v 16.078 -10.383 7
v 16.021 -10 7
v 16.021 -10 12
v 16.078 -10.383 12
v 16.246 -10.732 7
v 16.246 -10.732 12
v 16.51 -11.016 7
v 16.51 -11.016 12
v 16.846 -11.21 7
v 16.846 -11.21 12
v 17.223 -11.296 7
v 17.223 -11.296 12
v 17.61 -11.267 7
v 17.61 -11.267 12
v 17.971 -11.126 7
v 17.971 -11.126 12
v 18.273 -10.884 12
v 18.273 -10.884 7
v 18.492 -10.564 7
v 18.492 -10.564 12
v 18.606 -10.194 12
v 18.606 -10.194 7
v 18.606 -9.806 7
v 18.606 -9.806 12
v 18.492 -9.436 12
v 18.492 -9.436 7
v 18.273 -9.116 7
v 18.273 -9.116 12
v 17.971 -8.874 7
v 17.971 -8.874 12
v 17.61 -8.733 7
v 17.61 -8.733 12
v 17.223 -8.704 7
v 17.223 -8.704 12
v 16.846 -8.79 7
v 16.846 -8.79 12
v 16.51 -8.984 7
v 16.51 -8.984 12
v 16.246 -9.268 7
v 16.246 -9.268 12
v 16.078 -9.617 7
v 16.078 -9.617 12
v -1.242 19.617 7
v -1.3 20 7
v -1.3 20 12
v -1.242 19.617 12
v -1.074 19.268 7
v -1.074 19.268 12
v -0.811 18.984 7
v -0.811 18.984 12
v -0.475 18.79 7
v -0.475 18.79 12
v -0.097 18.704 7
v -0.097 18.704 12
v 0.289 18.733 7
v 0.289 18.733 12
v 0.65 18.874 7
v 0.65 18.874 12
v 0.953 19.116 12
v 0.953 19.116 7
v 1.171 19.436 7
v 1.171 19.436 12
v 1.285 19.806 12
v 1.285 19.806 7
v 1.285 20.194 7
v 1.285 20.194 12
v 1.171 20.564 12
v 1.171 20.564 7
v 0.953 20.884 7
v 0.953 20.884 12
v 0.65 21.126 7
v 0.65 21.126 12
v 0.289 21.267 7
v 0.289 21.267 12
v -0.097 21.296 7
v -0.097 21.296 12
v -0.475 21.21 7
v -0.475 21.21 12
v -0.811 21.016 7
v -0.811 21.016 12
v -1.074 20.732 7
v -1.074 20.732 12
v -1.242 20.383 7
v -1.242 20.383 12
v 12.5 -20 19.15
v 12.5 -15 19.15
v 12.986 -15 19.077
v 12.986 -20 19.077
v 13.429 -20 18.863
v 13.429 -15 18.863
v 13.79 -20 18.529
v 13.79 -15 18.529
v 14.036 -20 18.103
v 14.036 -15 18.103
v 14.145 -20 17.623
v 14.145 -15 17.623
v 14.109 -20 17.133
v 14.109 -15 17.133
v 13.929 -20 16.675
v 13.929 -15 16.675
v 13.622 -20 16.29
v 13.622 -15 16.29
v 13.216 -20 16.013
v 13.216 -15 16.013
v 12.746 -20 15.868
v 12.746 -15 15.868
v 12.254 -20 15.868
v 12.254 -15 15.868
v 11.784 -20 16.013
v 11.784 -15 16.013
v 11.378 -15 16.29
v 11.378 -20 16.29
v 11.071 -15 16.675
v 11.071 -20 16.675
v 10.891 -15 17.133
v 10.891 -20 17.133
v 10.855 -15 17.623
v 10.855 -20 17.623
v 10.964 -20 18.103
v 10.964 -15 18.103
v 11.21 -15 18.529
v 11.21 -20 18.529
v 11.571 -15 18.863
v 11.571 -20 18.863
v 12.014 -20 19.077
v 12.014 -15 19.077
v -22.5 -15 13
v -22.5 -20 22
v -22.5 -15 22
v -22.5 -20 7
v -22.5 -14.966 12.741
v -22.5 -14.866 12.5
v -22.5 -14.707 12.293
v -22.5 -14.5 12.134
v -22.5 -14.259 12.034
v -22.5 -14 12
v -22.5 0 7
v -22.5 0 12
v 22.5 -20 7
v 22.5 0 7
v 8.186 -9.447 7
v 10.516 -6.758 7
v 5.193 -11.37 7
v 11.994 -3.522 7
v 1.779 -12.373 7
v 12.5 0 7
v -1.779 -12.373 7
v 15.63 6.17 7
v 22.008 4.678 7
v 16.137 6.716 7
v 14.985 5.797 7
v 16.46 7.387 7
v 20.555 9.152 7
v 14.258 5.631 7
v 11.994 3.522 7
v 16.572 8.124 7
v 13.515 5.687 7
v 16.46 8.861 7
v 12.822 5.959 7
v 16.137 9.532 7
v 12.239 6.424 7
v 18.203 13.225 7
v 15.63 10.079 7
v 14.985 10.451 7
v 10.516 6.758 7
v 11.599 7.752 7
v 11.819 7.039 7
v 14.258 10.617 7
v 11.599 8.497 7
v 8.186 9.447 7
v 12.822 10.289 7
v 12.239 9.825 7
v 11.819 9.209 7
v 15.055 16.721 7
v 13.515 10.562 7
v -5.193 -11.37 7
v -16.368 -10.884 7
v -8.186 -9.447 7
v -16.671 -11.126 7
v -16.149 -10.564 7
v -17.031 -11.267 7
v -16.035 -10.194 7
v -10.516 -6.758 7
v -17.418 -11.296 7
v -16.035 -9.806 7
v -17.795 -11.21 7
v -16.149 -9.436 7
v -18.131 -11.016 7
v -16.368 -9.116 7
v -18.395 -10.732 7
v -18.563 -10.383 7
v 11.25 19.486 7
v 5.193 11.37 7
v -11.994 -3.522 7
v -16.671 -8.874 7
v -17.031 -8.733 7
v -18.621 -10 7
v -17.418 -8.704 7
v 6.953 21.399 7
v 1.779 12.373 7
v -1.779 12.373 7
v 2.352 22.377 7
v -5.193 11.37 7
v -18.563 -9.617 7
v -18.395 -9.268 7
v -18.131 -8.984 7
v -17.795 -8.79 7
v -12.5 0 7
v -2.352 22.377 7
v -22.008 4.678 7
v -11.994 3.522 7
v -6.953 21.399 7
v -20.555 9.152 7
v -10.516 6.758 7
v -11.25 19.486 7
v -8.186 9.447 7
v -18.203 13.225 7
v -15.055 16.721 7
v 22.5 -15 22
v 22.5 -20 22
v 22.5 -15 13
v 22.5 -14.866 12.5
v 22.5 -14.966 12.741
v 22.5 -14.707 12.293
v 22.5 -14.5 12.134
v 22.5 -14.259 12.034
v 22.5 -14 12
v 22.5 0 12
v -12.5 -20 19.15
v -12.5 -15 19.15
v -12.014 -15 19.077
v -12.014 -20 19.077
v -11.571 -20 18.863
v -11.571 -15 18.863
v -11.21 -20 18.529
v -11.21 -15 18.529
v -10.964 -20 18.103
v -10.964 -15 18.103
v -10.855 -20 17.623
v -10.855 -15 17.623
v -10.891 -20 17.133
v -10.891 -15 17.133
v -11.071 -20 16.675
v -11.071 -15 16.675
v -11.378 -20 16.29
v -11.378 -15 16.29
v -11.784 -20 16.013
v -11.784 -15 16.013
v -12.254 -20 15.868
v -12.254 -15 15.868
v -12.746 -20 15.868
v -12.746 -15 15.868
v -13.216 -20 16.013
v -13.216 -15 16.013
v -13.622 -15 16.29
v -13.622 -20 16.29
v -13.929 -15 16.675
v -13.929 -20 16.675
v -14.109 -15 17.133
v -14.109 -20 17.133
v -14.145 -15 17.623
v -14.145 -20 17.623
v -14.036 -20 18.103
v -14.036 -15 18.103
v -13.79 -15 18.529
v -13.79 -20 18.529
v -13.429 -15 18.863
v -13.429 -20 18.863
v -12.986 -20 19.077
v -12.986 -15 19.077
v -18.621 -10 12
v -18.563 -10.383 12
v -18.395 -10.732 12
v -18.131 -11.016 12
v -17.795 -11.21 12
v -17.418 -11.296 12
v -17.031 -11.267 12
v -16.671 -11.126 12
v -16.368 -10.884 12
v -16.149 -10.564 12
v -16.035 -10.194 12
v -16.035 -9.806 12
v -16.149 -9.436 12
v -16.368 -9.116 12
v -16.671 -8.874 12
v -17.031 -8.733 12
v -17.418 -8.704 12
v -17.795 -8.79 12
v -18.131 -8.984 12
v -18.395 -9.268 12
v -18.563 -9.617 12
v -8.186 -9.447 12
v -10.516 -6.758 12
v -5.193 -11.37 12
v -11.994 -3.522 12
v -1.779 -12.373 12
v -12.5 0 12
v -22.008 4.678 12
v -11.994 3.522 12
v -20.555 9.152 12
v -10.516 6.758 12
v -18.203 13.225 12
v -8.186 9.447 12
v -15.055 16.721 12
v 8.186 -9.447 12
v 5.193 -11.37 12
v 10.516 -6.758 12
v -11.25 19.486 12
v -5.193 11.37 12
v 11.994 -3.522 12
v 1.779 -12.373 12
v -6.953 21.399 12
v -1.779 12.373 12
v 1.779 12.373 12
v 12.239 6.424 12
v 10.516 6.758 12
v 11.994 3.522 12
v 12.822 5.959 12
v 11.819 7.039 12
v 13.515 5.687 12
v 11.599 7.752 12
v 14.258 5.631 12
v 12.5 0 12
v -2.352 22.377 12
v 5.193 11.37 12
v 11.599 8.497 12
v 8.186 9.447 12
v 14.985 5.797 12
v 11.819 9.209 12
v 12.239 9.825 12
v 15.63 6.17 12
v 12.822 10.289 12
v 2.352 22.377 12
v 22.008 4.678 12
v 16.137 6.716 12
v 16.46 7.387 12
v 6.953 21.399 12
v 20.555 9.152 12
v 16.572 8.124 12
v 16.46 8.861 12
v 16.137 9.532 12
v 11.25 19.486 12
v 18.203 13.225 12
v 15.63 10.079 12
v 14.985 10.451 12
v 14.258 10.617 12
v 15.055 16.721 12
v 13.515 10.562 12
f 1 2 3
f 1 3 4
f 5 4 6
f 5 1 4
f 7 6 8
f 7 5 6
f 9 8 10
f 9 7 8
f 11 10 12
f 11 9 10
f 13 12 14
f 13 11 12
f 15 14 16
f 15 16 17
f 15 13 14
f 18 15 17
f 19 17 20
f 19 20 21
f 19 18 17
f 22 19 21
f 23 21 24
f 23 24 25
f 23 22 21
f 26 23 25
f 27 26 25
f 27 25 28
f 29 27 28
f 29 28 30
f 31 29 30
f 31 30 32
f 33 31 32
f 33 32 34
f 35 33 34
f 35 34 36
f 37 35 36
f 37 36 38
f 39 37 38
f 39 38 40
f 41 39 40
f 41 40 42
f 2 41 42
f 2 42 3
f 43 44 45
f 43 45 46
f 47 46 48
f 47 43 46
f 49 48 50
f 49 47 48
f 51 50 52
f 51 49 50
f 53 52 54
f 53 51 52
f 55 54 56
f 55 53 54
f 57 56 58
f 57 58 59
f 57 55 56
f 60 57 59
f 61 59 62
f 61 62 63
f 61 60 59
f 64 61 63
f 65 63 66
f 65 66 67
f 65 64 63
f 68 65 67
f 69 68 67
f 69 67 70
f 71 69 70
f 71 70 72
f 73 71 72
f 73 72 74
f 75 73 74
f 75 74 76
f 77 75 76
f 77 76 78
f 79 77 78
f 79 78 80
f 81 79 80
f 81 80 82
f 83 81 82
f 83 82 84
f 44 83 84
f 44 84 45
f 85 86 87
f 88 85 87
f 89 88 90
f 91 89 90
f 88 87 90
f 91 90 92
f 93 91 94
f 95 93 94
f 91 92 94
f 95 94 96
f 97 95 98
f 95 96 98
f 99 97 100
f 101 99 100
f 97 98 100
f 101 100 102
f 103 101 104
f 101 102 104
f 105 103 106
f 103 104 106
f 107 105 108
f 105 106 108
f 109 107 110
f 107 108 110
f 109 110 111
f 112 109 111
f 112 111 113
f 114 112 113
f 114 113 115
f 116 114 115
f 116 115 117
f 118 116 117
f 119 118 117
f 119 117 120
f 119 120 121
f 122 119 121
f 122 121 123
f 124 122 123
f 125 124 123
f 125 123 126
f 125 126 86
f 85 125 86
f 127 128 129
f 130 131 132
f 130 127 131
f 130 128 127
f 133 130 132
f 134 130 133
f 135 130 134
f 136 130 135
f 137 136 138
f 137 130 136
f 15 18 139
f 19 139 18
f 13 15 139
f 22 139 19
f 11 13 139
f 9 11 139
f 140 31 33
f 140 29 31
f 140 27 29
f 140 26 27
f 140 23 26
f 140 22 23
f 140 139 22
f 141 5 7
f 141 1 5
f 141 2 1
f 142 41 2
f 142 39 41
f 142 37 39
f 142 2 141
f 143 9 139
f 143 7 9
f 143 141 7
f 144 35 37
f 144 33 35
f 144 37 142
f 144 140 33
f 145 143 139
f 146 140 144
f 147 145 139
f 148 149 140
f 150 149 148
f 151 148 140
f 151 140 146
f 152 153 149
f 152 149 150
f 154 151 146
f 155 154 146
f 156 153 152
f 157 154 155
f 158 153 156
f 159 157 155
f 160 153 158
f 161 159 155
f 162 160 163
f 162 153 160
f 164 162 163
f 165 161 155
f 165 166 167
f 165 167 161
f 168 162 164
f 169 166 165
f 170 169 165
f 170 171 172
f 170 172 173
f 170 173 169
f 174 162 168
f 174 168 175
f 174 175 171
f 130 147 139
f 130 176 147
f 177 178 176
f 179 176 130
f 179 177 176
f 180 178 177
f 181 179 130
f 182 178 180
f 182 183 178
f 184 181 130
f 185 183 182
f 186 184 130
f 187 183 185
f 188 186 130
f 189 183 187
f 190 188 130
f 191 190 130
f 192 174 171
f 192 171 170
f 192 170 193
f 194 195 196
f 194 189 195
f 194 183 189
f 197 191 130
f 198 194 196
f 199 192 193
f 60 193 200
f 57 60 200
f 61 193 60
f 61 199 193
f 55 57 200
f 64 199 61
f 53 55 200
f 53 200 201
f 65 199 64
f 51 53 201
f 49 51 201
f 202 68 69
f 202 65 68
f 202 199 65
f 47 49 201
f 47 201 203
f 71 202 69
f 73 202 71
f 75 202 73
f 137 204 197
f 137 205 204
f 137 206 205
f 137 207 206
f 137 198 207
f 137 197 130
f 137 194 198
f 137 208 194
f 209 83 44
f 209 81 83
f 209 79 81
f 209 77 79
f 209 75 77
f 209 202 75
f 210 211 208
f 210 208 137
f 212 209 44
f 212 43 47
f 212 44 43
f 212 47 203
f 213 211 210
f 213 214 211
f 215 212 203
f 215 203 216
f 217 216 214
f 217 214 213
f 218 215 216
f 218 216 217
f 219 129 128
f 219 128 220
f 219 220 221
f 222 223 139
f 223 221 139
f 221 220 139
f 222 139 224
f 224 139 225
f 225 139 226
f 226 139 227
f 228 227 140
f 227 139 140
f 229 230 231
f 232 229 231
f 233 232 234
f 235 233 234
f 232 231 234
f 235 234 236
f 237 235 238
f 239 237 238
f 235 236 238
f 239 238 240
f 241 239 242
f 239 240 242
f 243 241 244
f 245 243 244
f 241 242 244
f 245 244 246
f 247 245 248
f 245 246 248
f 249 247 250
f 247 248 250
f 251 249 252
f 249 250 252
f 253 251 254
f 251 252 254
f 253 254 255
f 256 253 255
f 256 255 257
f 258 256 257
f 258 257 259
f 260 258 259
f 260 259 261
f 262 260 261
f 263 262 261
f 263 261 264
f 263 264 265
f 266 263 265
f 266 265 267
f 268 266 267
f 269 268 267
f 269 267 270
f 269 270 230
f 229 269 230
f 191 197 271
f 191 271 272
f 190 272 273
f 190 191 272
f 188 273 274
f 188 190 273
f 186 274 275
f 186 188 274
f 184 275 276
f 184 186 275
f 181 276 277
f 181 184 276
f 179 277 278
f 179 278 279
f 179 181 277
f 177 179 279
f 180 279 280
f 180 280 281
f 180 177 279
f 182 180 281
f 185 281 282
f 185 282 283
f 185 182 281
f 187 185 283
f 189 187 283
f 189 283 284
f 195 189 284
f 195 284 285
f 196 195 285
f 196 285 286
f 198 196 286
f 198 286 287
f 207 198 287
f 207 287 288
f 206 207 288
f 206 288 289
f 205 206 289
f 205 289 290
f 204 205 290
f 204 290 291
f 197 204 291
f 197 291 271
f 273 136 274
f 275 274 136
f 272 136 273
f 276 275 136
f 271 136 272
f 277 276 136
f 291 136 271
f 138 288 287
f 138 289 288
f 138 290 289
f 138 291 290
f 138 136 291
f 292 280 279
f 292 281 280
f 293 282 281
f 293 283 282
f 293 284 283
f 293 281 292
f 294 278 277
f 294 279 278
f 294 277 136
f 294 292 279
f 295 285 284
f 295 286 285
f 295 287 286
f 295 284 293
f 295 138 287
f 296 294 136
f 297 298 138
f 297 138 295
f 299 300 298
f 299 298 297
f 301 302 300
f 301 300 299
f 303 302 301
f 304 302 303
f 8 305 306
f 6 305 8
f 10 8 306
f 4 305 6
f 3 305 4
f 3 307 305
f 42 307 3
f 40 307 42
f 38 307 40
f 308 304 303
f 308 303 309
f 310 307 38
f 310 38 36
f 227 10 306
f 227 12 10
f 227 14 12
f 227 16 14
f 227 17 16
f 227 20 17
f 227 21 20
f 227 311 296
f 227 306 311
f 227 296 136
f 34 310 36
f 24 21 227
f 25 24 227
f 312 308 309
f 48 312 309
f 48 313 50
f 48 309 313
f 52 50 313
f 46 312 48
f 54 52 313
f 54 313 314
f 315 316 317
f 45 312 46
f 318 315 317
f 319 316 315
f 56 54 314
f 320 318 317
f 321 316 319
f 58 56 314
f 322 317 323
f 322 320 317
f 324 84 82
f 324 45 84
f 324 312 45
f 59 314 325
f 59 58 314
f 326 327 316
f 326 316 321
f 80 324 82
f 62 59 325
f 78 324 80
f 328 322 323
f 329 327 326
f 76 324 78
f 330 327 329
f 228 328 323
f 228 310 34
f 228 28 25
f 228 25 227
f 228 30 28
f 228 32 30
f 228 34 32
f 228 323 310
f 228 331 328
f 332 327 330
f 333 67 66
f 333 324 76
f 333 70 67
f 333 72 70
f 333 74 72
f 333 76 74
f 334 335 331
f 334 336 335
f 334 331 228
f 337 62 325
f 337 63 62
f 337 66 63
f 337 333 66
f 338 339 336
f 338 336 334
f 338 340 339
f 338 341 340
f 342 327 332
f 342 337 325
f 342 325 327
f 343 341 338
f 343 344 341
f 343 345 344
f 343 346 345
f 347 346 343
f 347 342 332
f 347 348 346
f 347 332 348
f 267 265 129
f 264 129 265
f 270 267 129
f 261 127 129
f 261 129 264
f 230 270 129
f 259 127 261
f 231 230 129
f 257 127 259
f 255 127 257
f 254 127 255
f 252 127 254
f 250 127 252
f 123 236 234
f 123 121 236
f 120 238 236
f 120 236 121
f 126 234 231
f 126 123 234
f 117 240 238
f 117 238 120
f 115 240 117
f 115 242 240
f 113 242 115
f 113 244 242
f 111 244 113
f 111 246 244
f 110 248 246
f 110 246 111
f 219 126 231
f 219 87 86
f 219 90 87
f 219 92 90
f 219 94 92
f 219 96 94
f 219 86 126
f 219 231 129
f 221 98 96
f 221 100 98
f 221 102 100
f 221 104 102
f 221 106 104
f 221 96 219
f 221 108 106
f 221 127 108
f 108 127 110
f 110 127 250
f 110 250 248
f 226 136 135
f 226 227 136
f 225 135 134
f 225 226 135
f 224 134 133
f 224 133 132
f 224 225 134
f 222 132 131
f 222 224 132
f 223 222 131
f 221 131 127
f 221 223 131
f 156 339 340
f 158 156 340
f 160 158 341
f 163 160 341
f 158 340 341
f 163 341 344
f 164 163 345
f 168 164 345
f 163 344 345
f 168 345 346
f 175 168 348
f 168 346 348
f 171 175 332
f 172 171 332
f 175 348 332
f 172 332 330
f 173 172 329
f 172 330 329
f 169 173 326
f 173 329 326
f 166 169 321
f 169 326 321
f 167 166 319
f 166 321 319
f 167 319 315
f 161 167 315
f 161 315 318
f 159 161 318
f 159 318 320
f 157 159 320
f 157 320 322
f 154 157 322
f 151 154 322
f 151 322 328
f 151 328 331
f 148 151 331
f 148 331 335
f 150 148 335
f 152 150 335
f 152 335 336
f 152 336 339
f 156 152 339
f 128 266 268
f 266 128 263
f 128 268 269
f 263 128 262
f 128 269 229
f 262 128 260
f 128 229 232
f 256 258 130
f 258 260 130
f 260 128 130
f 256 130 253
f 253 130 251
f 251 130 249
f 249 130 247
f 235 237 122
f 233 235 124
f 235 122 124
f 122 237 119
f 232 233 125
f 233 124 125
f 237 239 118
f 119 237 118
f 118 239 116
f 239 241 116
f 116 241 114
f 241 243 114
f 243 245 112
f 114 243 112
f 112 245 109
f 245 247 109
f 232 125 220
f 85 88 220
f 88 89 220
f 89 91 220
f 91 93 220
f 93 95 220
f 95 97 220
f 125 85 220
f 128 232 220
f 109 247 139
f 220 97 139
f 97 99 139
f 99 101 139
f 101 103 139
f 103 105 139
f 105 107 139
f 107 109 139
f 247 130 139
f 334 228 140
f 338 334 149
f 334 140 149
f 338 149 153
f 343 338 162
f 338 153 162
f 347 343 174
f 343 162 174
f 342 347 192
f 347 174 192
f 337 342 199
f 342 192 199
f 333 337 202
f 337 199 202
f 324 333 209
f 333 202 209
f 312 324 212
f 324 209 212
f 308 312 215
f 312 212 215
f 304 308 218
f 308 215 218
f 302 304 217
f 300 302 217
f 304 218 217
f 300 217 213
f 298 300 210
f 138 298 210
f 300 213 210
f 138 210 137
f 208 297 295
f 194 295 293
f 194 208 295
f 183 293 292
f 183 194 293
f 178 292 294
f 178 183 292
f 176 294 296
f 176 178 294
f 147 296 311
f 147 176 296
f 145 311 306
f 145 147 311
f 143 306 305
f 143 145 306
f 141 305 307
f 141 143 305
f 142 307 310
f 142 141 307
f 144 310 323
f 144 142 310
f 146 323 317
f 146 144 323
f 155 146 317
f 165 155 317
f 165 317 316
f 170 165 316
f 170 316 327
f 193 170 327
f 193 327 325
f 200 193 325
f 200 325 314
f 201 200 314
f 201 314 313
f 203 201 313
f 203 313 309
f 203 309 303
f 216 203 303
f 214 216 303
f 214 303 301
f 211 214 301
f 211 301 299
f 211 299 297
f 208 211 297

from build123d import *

# Parameters (mm, degrees)
SKETCH_1_R          = 22.5
SKETCH_1_R_2        = 12.5
SKETCH_1_R_3        = 1.3
EXTRUDE_1_DEPTH     = 4
EXTRUDE_START       = -4
EXTRUDE_2_DEPTH     = 4
SKETCH_3_W          = 45
SKETCH_3_H          = 5
EXTRUDE_3_DEPTH     = 8
CUT_EXTRUDE_START   = -10
CUT_EXTRUDE_2_DEPTH = 10
SKETCH_6_R          = 1.3
SKETCH_6_R_2        = 12.5
EXTRUDE_4_DEPTH     = 8
CUT_EXTRUDE_3_DEPTH = 4
SKETCH_8_R          = 2.5
CUT_EXTRUDE_4_DEPTH = 10
SKETCH_9_W          = 45
SKETCH_9_H          = 5
EXTRUDE_5_DEPTH     = 10
FILLET_1_R          = 1
CUT_EXTRUDE_5_DEPTH = 3
SKETCH_11_R         = 1.65
CUT_EXTRUDE_6_DEPTH = 13


with BuildPart() as part:
    # 草图1 → 凸台-拉伸1 (new body)
    with BuildSketch(Plane.XY):
        Circle(SKETCH_1_R)
        Circle(SKETCH_1_R_2, mode=Mode.SUBTRACT)
        with Locations((0, 20)):
            Circle(SKETCH_1_R_3, mode=Mode.SUBTRACT)
        with Locations((-17.320508076, -10)):
            Circle(SKETCH_1_R_3, mode=Mode.SUBTRACT)
        with Locations((17.320508076, -10)):
            Circle(SKETCH_1_R_3, mode=Mode.SUBTRACT)
    extrude(amount=EXTRUDE_1_DEPTH)

    # 草图2 → 凸台-拉伸2 (add)
    with BuildSketch(Plane.XY.offset(4).offset(EXTRUDE_START)):
        with BuildLine():
            Line((-22.5, 0), (-22.5, -20))
            Line((-22.5, -20), (-10.307764064, -20))
            ThreePointArc((-10.307764064, -20), (-19.211646096, -11.711646096), (-22.5, 0))
        make_face()
        with BuildLine():
            Line((22.5, -20), (22.5, 0))
            ThreePointArc((22.5, 0), (19.211646096, -11.711646096), (10.307764064, -20))
            Line((10.307764064, -20), (22.5, -20))
        make_face()
    extrude(amount=EXTRUDE_2_DEPTH)

    # 草图3 → 凸台-拉伸3 (add)
    with BuildSketch(Plane.XY.offset(4)):
        with Locations((0, -17.5)):
            Rectangle(SKETCH_3_W, SKETCH_3_H)
    extrude(amount=EXTRUDE_3_DEPTH)

    # 草图5 → 切除-拉伸2 (cut)
    with BuildSketch(Plane.XY.offset(4).offset(CUT_EXTRUDE_START)):
        with BuildLine():
            Line((10.307764064, -20), (-10.307764064, -20))
            ThreePointArc((-10.307764064, -20), (0, -22.5), (10.307764064, -20))
        make_face()
    extrude(amount=CUT_EXTRUDE_2_DEPTH, mode=Mode.SUBTRACT)

    # 草图6 → 凸台-拉伸4 (add)
    with BuildSketch(Plane.XY.offset(4)):
        with BuildLine():
            Line((-22.5, -15), (22.5, -15))
            Line((22.5, -15), (22.5, 0))
            ThreePointArc((22.5, 0), (0, 22.5), (-22.5, 0))
            Line((-22.5, 0), (-22.5, -15))
        make_face()
        with Locations(Location((17.320508076, -10, 0), (0, 0, 180))):
            Circle(SKETCH_6_R, mode=Mode.SUBTRACT)
        with Locations(Location((-17.320508076, -10, 0), (0, 0, 180))):
            Circle(SKETCH_6_R, mode=Mode.SUBTRACT)
        with Locations(Location((0, 20, 0), (0, 0, 180))):
            Circle(SKETCH_6_R, mode=Mode.SUBTRACT)
        with Locations(Location((0, 0, 0), (0, 0, 180))):
            Circle(SKETCH_6_R_2, mode=Mode.SUBTRACT)
    extrude(amount=EXTRUDE_4_DEPTH)

    # 草图7 → 切除-拉伸3 (cut)
    with BuildSketch(Plane(origin=(0, 0, 0), x_dir=(-1, 0, 0), z_dir=(0, 0, -1))):
        with BuildLine():
            Line((-22.5, 0), (-22.5, -20))
            Line((-22.5, -20), (22.5, -20))
            Line((22.5, -20), (22.5, 0))
            ThreePointArc((22.5, 0), (0, 22.5), (-22.5, 0))
        make_face()
    extrude(amount=-CUT_EXTRUDE_3_DEPTH, mode=Mode.SUBTRACT)

    # 草图8 → 切除-拉伸4 (cut)
    with BuildSketch(Plane.XY.offset(12)):
        with Locations((14.071515431, 8.124193222)):
            Circle(SKETCH_8_R)
    extrude(amount=-CUT_EXTRUDE_4_DEPTH, mode=Mode.SUBTRACT)

    # 草图9 → 凸台-拉伸5 (add)
    with BuildSketch(Plane.XY.offset(12)):
        with Locations((0, -17.5)):
            Rectangle(SKETCH_9_W, SKETCH_9_H)
    extrude(amount=EXTRUDE_5_DEPTH)

    # 圆角1
    fillet_1_edges = [part.edges().sort_by_distance(p)[0] for p in [
        (0, -15, 12),
    ]]
    fillet(fillet_1_edges, radius=FILLET_1_R)

    # 草图10 → 切除-拉伸5 (cut)
    with BuildSketch(Plane(origin=(0, 0, 4), x_dir=(-1, 0, 0), z_dir=(0, 0, -1))):
        with BuildLine():
            Line((-22.5, 0), (-22.5, -20))
            Line((-22.5, -20), (22.5, -20))
            Line((22.5, -20), (22.5, 0))
            ThreePointArc((22.5, 0), (0, 22.5), (-22.5, 0))
        make_face()
    extrude(amount=-CUT_EXTRUDE_5_DEPTH, mode=Mode.SUBTRACT)

    # 草图11 → 切除-拉伸6 (cut)
    with BuildSketch(Plane(origin=(0, -15, 0), x_dir=(1, 0, 0), z_dir=(0, 1, 0))):
        with Locations(Location((-12.5, -17.5, 0), (0, 0, 270))):
            Circle(SKETCH_11_R)
        with Locations(Location((12.5, -17.5, 0), (0, 0, 270))):
            Circle(SKETCH_11_R)
    extrude(amount=-CUT_EXTRUDE_6_DEPTH, mode=Mode.SUBTRACT)


solid = part.part
